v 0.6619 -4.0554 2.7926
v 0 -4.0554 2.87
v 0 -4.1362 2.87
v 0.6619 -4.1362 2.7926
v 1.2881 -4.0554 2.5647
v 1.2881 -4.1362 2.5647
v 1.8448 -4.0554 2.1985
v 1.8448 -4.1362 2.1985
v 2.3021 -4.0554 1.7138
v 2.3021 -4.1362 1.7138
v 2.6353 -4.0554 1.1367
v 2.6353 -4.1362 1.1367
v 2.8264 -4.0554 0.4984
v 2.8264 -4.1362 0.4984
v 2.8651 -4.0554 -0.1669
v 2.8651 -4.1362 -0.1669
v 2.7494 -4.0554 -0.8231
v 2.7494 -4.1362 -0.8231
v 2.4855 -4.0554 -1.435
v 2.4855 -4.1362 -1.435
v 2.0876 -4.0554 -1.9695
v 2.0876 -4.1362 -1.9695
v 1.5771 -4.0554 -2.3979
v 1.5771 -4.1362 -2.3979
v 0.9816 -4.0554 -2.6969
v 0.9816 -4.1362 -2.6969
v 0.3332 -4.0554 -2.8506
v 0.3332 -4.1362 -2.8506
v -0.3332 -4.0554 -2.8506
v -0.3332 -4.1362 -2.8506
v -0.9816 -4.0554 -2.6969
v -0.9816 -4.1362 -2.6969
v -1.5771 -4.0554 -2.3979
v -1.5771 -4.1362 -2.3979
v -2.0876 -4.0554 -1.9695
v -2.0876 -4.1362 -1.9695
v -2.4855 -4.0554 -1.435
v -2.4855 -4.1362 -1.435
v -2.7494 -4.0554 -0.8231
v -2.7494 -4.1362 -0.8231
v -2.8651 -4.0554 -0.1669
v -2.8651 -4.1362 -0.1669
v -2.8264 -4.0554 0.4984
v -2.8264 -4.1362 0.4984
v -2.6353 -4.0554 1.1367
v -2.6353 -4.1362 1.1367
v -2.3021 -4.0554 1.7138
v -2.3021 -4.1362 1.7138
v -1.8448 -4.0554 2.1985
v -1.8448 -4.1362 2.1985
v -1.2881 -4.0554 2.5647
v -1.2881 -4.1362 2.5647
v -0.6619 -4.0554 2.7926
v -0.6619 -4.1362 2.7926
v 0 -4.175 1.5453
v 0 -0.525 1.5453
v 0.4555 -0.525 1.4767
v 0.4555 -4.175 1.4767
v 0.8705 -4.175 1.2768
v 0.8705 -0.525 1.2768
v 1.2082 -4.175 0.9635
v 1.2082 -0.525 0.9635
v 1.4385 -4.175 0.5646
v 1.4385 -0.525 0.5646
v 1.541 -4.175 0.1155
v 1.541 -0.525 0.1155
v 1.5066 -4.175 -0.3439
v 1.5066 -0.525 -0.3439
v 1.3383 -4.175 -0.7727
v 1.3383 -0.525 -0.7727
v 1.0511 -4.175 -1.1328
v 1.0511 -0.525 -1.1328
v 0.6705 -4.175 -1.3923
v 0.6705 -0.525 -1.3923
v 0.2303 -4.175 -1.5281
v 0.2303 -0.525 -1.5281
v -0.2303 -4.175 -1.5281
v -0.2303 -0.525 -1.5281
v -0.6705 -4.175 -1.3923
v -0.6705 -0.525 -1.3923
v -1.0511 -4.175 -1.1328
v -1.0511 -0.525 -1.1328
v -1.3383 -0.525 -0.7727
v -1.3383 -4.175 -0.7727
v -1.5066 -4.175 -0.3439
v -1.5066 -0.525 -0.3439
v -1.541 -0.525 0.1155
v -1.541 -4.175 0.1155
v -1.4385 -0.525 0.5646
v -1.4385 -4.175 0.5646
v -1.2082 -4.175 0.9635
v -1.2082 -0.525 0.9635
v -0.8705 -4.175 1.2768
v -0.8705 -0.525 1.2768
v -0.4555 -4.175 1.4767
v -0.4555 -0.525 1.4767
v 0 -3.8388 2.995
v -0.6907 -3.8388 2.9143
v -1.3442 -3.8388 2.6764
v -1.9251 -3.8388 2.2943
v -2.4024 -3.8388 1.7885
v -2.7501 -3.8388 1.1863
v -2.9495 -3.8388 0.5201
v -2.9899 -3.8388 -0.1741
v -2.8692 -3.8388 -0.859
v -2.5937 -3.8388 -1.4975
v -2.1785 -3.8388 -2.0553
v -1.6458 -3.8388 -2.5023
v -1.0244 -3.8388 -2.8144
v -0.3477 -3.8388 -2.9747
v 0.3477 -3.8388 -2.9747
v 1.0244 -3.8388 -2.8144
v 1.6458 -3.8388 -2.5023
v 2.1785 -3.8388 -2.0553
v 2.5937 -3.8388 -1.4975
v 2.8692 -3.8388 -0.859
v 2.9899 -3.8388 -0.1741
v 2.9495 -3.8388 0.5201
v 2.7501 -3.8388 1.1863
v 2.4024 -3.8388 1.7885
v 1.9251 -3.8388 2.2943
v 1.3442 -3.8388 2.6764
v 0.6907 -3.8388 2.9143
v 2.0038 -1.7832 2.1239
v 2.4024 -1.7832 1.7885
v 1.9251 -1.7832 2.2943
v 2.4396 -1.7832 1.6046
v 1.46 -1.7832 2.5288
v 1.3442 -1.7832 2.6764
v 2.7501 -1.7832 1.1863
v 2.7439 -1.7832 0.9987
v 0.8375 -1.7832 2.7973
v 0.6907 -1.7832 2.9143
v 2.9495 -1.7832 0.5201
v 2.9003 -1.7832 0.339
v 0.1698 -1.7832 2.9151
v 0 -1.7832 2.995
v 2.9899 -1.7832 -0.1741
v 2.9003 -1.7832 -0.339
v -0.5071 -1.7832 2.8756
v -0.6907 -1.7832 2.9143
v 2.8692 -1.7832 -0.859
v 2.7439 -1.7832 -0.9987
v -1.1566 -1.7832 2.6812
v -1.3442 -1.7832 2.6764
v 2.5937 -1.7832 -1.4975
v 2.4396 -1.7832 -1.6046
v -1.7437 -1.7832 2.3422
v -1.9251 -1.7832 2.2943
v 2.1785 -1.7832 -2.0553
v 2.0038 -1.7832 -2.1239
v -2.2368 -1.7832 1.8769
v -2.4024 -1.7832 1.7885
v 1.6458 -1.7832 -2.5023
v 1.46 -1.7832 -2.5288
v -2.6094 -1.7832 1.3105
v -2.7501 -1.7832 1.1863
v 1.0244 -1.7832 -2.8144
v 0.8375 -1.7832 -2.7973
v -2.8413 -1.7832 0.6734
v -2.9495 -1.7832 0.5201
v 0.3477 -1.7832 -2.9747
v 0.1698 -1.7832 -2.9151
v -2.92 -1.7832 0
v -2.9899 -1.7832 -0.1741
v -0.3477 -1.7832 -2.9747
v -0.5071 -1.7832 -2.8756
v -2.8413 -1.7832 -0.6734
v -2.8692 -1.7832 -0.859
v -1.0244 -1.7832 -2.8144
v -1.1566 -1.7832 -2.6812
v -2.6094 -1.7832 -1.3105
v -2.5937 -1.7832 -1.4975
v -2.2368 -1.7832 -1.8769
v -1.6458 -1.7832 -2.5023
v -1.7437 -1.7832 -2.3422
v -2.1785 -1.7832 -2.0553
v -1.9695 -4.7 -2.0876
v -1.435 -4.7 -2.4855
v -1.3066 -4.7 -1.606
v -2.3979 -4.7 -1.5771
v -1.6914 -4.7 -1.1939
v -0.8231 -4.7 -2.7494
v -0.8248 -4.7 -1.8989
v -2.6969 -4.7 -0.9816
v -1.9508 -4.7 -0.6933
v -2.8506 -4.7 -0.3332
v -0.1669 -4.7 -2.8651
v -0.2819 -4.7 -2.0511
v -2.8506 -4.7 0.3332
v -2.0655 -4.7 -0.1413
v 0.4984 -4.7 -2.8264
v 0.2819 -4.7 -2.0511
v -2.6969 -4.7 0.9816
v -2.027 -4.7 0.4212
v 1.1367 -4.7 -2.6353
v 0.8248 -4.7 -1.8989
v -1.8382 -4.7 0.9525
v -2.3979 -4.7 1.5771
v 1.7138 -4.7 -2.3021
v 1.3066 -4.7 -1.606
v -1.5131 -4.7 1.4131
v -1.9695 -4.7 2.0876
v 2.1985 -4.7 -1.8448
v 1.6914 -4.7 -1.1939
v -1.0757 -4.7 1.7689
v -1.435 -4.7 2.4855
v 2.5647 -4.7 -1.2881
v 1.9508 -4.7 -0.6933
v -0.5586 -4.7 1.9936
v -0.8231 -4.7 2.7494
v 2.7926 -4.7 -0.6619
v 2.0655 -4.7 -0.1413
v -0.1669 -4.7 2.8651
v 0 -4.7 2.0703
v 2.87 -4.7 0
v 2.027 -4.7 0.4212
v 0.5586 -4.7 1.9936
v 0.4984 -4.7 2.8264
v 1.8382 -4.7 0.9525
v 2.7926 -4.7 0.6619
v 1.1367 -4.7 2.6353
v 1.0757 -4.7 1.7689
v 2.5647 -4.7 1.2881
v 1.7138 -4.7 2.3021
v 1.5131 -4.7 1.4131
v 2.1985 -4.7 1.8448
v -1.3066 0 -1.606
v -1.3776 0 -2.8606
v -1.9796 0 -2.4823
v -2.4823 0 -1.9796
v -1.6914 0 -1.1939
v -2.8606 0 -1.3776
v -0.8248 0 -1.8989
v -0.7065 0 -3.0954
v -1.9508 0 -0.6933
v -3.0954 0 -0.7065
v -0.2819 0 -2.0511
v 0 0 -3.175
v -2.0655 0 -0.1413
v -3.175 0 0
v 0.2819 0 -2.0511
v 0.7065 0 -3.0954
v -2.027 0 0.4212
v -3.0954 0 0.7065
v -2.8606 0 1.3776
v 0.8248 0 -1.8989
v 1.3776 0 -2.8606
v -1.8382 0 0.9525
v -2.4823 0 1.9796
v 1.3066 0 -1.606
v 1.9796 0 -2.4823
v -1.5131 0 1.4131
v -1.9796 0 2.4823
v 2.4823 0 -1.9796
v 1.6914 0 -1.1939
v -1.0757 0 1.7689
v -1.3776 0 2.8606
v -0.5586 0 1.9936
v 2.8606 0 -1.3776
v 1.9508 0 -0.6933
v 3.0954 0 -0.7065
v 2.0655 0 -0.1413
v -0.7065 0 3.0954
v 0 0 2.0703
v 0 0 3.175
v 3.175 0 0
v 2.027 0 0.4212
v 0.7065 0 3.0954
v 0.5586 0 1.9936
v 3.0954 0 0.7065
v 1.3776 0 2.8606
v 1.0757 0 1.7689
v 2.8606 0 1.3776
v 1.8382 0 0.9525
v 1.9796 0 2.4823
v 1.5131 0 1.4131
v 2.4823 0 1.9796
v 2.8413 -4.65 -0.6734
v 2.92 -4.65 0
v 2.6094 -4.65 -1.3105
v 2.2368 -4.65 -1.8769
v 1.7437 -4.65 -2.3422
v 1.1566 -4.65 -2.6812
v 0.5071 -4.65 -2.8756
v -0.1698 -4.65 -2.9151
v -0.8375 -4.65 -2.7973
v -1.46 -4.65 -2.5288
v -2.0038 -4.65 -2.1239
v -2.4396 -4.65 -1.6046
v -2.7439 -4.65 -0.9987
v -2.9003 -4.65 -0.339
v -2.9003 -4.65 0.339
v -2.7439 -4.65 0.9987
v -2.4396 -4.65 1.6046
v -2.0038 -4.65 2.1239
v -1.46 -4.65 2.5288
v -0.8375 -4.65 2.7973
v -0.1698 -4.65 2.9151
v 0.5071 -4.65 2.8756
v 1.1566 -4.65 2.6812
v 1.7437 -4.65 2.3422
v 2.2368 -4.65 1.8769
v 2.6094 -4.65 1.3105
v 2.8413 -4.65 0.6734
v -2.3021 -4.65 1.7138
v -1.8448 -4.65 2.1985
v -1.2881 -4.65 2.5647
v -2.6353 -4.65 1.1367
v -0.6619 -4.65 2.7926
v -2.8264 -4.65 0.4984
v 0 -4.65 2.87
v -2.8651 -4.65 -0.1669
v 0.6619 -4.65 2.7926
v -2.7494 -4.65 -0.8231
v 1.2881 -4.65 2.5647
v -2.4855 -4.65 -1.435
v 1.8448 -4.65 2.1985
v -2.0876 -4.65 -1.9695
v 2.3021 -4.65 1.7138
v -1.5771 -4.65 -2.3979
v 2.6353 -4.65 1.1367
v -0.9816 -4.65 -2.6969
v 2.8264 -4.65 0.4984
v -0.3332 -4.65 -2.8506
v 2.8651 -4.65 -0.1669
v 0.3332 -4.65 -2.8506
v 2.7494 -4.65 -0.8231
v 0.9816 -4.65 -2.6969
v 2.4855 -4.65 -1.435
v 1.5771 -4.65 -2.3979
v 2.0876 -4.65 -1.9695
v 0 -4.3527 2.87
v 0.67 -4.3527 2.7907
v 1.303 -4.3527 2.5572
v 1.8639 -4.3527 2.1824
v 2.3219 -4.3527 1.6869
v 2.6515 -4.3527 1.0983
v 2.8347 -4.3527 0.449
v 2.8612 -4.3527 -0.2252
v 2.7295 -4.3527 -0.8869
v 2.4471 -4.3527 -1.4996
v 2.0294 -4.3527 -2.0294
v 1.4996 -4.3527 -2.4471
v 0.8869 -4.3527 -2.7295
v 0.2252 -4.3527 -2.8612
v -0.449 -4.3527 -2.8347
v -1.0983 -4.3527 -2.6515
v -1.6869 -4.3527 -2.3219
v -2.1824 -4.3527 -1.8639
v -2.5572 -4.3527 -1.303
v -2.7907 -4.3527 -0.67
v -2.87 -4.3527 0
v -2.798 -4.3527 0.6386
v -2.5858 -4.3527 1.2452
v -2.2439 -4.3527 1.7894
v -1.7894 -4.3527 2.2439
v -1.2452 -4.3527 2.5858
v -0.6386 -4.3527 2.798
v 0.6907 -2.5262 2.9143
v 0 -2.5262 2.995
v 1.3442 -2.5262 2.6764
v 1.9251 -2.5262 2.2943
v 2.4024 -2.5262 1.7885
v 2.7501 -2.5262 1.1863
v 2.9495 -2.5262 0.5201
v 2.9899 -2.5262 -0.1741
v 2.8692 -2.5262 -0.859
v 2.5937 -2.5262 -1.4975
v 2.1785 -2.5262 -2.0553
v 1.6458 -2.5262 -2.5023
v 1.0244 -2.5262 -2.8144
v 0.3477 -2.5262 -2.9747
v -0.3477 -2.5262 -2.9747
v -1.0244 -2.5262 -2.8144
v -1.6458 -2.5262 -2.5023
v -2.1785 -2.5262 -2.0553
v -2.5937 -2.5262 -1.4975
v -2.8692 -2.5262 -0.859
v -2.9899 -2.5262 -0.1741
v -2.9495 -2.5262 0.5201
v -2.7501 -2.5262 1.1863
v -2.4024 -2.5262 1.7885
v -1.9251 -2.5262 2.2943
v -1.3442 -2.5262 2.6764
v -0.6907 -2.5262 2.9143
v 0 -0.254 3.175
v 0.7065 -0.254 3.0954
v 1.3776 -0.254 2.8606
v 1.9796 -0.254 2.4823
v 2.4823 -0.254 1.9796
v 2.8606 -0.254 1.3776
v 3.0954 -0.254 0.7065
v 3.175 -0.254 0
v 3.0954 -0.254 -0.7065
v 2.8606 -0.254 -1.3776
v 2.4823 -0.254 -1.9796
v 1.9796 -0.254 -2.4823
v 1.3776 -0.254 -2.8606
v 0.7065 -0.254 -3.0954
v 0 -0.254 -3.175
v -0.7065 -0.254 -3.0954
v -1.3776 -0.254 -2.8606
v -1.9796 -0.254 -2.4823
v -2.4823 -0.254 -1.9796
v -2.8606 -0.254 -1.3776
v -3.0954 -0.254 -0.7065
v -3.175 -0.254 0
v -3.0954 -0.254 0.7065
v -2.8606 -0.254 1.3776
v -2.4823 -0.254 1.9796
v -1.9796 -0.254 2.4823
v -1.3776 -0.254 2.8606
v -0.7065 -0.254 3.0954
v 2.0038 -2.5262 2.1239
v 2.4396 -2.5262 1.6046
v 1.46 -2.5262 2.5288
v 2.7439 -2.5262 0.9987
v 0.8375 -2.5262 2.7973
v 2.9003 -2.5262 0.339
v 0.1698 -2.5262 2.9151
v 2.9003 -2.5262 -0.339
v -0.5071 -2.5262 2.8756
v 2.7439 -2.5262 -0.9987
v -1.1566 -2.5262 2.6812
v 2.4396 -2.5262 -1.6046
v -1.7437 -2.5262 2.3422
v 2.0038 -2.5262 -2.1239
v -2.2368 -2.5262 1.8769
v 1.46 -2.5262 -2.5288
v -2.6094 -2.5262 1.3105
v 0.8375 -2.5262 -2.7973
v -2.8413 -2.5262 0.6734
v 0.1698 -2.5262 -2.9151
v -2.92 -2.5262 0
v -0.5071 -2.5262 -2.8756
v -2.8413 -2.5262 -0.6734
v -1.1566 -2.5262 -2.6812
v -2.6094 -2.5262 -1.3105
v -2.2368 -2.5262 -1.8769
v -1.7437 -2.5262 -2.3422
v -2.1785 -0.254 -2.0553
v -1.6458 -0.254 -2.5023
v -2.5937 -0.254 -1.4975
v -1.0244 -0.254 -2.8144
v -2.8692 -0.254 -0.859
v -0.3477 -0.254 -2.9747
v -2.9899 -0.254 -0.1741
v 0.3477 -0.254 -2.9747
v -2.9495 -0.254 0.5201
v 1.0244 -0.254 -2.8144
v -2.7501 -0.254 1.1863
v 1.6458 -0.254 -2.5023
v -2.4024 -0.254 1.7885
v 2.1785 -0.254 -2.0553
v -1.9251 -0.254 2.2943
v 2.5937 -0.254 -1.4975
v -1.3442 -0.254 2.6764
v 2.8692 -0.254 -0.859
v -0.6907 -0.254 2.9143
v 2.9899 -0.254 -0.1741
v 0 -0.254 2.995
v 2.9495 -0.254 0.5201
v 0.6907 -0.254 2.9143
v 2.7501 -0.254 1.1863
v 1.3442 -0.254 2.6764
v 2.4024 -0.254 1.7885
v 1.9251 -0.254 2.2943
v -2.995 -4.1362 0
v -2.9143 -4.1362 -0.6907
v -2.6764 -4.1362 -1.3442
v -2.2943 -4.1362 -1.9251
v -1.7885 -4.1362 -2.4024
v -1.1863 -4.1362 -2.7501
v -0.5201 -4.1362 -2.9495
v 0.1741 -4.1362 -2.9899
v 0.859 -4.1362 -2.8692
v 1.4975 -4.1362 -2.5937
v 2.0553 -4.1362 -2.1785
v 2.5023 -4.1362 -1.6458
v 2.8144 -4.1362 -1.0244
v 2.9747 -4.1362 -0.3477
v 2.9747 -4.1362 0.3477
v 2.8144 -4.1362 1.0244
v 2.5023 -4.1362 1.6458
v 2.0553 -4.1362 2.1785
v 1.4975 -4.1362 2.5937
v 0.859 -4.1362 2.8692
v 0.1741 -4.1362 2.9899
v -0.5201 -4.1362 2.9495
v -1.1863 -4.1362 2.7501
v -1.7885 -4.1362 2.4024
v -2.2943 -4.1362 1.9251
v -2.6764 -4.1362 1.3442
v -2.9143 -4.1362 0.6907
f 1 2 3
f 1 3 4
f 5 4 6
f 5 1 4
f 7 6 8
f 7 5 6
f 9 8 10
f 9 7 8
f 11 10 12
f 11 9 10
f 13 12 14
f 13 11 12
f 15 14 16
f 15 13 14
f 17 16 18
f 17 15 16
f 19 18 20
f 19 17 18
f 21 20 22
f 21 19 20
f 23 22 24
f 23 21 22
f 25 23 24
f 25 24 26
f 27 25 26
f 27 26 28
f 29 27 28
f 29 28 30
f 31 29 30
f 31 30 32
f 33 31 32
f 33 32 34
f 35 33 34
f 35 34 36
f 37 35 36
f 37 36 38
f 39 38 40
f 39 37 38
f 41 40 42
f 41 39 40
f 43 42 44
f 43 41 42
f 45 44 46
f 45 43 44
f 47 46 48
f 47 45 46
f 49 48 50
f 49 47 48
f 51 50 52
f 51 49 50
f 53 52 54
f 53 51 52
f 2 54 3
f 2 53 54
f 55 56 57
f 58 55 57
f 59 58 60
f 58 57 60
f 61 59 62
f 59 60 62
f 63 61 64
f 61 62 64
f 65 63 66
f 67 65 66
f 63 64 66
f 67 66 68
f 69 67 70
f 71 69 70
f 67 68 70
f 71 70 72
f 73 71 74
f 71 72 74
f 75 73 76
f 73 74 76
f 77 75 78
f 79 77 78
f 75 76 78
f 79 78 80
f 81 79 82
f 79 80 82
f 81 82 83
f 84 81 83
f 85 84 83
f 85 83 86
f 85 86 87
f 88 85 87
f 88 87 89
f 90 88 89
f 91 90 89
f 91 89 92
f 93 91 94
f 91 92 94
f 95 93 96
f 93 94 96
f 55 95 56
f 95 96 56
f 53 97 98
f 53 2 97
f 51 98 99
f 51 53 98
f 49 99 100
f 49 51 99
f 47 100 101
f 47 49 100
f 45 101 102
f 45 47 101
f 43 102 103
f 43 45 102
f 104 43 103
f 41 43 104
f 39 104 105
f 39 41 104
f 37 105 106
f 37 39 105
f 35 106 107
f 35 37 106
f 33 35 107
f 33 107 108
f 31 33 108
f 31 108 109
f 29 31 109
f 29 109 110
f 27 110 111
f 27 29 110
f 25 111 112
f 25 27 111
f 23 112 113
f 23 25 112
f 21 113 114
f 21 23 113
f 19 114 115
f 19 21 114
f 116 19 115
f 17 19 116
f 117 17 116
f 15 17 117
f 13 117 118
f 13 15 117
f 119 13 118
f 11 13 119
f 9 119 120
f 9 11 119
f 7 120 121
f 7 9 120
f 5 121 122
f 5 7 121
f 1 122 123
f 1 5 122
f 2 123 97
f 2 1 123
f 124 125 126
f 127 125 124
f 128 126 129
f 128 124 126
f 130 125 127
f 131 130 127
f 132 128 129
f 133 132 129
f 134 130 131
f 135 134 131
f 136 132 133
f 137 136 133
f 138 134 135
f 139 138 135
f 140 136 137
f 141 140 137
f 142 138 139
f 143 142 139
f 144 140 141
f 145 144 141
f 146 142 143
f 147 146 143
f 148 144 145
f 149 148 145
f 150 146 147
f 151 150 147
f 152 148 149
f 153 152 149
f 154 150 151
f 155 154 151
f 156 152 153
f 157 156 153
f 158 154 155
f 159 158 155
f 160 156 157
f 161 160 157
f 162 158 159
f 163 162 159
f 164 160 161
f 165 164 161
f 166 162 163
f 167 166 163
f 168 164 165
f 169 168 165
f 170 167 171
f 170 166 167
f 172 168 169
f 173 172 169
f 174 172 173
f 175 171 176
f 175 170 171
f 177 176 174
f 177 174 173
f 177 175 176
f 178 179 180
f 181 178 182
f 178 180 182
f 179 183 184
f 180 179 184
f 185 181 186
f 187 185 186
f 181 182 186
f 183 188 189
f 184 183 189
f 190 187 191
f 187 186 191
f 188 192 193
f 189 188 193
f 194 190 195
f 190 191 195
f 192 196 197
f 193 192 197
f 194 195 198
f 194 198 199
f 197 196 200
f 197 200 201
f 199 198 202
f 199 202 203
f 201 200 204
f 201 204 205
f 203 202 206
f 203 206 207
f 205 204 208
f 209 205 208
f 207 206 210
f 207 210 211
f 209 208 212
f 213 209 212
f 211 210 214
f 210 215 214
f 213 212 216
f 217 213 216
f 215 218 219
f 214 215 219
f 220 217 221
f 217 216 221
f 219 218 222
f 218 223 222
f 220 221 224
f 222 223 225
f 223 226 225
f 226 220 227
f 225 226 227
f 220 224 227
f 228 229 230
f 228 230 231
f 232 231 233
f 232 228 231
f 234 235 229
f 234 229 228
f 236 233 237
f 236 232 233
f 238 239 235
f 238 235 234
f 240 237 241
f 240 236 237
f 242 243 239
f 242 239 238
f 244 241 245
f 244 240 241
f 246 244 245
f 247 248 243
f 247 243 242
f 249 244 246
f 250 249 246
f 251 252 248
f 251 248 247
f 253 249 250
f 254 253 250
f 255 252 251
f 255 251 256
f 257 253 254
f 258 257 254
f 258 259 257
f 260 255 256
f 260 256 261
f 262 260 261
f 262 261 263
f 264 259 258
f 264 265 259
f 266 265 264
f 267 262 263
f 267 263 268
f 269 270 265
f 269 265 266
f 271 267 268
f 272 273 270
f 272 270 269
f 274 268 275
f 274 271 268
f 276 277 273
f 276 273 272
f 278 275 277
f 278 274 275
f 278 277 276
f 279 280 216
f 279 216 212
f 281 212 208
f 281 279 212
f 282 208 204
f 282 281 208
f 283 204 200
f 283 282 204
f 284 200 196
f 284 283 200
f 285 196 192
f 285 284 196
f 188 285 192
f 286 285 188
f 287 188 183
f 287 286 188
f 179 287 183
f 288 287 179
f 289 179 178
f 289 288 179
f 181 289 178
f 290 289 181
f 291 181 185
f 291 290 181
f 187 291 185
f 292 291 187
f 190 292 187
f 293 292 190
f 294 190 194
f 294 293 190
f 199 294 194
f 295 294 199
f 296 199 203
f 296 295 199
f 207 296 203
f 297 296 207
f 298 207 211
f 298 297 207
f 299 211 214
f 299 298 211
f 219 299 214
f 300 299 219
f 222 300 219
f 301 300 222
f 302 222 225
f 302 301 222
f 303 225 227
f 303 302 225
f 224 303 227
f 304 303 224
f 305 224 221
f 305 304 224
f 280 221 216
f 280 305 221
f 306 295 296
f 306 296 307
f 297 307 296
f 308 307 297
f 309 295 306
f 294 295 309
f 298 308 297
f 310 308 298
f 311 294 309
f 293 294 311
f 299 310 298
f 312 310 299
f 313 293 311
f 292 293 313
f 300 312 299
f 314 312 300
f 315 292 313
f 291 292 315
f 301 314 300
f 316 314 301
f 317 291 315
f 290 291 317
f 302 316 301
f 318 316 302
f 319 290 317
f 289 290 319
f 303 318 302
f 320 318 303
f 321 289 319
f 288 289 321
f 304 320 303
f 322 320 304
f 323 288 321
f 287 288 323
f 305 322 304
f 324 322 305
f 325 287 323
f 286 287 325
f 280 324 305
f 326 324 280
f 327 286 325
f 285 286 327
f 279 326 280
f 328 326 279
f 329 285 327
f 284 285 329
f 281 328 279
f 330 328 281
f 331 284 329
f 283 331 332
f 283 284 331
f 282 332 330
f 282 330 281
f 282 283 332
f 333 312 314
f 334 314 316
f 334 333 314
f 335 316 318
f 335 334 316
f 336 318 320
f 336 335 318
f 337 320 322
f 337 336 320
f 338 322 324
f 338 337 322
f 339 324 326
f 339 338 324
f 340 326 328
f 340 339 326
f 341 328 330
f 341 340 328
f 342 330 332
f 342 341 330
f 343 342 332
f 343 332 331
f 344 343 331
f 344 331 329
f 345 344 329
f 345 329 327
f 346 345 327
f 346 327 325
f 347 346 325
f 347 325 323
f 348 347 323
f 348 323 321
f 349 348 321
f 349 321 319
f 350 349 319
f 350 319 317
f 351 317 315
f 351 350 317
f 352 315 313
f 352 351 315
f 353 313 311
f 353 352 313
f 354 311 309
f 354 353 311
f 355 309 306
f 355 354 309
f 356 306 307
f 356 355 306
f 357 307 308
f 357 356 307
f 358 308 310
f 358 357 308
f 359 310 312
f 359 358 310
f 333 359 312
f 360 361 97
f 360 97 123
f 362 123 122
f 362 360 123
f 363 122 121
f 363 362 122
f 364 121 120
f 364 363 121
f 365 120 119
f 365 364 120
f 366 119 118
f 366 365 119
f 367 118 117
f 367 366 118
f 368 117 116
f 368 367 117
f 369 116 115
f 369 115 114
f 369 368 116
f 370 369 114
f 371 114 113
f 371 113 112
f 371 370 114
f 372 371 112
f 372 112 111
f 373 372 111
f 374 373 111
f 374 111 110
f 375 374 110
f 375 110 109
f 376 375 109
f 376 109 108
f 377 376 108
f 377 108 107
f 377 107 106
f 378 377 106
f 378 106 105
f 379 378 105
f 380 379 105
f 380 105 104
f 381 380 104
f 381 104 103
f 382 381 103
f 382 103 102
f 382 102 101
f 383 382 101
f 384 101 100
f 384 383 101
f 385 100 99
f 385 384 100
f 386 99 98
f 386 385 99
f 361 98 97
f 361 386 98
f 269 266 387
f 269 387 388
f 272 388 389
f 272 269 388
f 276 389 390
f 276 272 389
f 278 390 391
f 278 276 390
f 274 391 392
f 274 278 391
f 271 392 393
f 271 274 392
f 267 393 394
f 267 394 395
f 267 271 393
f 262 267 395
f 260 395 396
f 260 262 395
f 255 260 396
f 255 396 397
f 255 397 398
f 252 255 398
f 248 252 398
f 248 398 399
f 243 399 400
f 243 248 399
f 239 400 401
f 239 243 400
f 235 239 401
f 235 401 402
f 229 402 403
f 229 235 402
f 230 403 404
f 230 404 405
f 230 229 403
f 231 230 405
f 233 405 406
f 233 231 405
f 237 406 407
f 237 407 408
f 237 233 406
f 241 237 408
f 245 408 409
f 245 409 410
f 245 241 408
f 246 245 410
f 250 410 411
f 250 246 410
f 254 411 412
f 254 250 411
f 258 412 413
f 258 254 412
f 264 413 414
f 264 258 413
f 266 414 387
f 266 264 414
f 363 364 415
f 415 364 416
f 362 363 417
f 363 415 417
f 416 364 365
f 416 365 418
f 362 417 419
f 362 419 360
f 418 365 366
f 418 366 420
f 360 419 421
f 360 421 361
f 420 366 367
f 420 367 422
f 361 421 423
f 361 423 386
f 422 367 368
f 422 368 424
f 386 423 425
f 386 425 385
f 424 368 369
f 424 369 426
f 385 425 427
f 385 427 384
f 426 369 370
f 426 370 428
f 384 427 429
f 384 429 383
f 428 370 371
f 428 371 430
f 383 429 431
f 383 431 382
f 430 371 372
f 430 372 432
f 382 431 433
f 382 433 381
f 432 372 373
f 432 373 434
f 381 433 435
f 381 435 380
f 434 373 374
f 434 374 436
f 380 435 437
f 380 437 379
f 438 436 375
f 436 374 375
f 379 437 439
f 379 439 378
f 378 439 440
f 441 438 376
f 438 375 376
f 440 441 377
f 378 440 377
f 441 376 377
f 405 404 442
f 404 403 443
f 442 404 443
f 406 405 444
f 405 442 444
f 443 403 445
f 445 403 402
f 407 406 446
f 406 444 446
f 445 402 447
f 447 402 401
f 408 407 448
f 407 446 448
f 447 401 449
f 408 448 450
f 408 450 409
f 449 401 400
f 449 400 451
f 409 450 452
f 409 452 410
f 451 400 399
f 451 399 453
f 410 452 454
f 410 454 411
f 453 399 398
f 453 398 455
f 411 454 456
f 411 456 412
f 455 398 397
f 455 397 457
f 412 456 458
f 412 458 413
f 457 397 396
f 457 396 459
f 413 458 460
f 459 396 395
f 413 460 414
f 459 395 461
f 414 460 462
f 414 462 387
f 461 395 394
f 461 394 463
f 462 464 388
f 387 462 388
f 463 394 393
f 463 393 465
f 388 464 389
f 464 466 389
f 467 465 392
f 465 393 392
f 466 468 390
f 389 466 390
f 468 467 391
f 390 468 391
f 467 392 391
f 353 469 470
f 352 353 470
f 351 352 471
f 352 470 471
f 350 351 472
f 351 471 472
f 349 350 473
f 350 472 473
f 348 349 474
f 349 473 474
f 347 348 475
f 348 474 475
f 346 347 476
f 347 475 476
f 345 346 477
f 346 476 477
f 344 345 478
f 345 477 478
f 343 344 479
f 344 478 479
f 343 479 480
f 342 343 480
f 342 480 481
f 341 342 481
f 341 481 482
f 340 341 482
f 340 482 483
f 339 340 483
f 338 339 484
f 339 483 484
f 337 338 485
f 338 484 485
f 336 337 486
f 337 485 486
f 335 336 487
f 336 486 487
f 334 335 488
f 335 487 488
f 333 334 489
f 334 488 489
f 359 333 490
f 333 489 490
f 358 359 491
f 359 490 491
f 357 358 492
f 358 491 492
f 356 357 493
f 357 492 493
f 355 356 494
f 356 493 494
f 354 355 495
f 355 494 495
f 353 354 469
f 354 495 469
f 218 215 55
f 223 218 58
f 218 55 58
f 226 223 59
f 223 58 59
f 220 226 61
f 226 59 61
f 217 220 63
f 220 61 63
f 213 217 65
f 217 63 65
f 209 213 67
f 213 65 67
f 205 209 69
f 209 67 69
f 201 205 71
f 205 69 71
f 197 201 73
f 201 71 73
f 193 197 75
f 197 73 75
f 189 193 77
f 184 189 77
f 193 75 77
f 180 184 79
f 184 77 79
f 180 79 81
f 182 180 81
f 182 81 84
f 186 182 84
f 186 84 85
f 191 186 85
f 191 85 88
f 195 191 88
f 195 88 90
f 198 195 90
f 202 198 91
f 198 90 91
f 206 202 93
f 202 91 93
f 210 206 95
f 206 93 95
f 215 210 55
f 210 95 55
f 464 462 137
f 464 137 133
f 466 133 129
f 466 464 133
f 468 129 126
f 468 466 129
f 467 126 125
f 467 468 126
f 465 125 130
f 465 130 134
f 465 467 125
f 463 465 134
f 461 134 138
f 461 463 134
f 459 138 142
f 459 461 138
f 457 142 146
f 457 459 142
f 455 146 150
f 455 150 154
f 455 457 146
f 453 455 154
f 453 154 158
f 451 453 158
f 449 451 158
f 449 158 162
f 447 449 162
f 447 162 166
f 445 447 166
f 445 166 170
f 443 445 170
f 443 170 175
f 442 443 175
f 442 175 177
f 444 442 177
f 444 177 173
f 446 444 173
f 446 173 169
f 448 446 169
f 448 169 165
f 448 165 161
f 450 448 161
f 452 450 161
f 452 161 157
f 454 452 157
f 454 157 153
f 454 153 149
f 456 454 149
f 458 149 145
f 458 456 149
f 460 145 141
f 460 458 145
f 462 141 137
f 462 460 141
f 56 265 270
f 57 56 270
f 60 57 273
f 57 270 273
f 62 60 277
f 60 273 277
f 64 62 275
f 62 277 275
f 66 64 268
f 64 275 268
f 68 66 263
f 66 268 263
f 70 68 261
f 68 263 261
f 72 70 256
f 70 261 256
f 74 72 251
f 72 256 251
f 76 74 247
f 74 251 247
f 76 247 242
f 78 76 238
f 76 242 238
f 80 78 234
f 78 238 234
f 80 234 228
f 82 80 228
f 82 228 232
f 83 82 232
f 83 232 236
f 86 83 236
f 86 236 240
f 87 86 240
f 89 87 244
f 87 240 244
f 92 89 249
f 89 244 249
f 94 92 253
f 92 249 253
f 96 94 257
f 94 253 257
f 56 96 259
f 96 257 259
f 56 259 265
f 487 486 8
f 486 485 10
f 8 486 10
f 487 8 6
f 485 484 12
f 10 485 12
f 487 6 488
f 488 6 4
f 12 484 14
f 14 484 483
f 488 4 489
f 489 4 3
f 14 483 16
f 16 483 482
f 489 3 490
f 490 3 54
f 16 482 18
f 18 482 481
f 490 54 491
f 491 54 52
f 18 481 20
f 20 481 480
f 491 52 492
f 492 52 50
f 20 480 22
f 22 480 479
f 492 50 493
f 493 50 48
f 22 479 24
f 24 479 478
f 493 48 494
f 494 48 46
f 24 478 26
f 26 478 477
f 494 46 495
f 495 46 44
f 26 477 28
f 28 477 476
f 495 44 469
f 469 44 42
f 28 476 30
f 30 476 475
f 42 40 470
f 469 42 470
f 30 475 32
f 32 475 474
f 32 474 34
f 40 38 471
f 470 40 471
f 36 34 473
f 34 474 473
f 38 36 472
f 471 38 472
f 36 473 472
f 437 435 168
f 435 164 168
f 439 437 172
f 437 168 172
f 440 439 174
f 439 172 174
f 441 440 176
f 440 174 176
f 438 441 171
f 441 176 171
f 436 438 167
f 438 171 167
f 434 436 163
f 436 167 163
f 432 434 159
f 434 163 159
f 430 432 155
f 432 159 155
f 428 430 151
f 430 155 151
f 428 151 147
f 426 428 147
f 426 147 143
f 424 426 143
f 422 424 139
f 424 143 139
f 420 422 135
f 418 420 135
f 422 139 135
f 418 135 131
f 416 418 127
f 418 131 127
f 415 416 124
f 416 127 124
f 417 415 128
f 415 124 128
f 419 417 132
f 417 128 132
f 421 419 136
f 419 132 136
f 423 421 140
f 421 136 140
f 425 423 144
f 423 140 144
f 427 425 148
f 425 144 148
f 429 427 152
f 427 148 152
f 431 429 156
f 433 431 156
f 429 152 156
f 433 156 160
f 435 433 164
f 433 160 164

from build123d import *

# Parameters (mm, degrees)
SKETCH1_R      = 2.87
EXTRUDE1_DEPTH = 4.7
SKETCH1_4_R    = 2.995
EXTRUDE2_DEPTH = 3.838846
SKETCH1_3_R    = 3.175
EXTRUDE3_DEPTH = 0.254
SKETCH2_R      = 2.995
EXTRUDE4_DEPTH = 0.216506
EXTRUDE4_TAPER = 30
SKETCH8_R      = 1.545336663
EXTRUDE6_DEPTH = 4.7
CHAMFER1_SIZE  = 0.525
SKETCH11_W     = 0.255
SKETCH11_H     = 0.74295


# Read off the part's stored shape, not the designer's step: Extrude5
with BuildPart() as part:
    # Sketch1 → Extrude1 (new body)
    with BuildSketch(Plane(origin=(0, 0, 0), x_dir=(1, 0, 0), z_dir=(0, 1, 0))):
        with Locations(Location((0, 0, 0), (0, 0, 270))):
            Circle(SKETCH1_R)
    extrude(amount=-EXTRUDE1_DEPTH)

    # Sketch1<4> → Extrude2 (add)
    with BuildSketch(Plane(origin=(0, 0, 0), x_dir=(1, 0, 0), z_dir=(0, 1, 0))):
        with Locations(Location((0, 0, 0), (0, 0, 270))):
            Circle(SKETCH1_4_R)
    extrude(amount=-EXTRUDE2_DEPTH)

    # Sketch1<3> → Extrude3 (add)
    with BuildSketch(Plane(origin=(0, 0, 0), x_dir=(1, 0, 0), z_dir=(0, 1, 0))):
        with Locations(Location((0, 0, 0), (0, 0, 270))):
            Circle(SKETCH1_3_R)
    extrude(amount=-EXTRUDE3_DEPTH)

    # Sketch2 → Extrude4 (add)
    with BuildSketch(Plane.XZ.offset(3.838846189)):
        with Locations(Location((0, 0, 0), (0, 0, 90))):
            Circle(SKETCH2_R)
    extrude(amount=EXTRUDE4_DEPTH, taper=EXTRUDE4_TAPER)

    # Extrude5 outline → Extrude5 (revolve)
    with BuildSketch(Plane.XY):
        Polygon((2.87, -4.65), (2.87, -4.7), (2.92, -4.65), align=None)
    revolve(axis=Axis((0, 0, 0), (0, 1, 0)))

    # Sketch5 → Revolve1 (revolve)
    with BuildSketch(Plane.XY):
        Polygon((-2.87, -4.35267627), (-2.995, -4.136169919), (-2.87, -4.136169919), align=None)
    revolve(axis=Axis((0, 0, 0), (0, -1, 0)))

    # Sketch8 → Extrude6 (cut)
    with BuildSketch(Plane(origin=(0, 0, 0), x_dir=(1, 0, 0), z_dir=(0, 1, 0))):
        with Locations(Location((0, 0, 0), (0, 0, 270))):
            Circle(SKETCH8_R)
    extrude(amount=-EXTRUDE6_DEPTH, mode=Mode.SUBTRACT)

    # Chamfer1
    chamfer1_edges = [part.edges().sort_by_distance(p)[0] for p in [
        (0, -4.7, -1.545336663),
        (0, 0, -1.545336663),
    ]]
    chamfer(chamfer1_edges, length=CHAMFER1_SIZE)

    # Sketch11 → Cut-Revolve1 (revolve, cut)
    with BuildSketch(Plane.XY):
        with Locations((-3.0475, -2.15467627)):
            Rectangle(SKETCH11_W, SKETCH11_H)
    revolve(axis=Axis((0, 0, 0), (0, -1, 0)), mode=Mode.SUBTRACT)


solid = part.part
